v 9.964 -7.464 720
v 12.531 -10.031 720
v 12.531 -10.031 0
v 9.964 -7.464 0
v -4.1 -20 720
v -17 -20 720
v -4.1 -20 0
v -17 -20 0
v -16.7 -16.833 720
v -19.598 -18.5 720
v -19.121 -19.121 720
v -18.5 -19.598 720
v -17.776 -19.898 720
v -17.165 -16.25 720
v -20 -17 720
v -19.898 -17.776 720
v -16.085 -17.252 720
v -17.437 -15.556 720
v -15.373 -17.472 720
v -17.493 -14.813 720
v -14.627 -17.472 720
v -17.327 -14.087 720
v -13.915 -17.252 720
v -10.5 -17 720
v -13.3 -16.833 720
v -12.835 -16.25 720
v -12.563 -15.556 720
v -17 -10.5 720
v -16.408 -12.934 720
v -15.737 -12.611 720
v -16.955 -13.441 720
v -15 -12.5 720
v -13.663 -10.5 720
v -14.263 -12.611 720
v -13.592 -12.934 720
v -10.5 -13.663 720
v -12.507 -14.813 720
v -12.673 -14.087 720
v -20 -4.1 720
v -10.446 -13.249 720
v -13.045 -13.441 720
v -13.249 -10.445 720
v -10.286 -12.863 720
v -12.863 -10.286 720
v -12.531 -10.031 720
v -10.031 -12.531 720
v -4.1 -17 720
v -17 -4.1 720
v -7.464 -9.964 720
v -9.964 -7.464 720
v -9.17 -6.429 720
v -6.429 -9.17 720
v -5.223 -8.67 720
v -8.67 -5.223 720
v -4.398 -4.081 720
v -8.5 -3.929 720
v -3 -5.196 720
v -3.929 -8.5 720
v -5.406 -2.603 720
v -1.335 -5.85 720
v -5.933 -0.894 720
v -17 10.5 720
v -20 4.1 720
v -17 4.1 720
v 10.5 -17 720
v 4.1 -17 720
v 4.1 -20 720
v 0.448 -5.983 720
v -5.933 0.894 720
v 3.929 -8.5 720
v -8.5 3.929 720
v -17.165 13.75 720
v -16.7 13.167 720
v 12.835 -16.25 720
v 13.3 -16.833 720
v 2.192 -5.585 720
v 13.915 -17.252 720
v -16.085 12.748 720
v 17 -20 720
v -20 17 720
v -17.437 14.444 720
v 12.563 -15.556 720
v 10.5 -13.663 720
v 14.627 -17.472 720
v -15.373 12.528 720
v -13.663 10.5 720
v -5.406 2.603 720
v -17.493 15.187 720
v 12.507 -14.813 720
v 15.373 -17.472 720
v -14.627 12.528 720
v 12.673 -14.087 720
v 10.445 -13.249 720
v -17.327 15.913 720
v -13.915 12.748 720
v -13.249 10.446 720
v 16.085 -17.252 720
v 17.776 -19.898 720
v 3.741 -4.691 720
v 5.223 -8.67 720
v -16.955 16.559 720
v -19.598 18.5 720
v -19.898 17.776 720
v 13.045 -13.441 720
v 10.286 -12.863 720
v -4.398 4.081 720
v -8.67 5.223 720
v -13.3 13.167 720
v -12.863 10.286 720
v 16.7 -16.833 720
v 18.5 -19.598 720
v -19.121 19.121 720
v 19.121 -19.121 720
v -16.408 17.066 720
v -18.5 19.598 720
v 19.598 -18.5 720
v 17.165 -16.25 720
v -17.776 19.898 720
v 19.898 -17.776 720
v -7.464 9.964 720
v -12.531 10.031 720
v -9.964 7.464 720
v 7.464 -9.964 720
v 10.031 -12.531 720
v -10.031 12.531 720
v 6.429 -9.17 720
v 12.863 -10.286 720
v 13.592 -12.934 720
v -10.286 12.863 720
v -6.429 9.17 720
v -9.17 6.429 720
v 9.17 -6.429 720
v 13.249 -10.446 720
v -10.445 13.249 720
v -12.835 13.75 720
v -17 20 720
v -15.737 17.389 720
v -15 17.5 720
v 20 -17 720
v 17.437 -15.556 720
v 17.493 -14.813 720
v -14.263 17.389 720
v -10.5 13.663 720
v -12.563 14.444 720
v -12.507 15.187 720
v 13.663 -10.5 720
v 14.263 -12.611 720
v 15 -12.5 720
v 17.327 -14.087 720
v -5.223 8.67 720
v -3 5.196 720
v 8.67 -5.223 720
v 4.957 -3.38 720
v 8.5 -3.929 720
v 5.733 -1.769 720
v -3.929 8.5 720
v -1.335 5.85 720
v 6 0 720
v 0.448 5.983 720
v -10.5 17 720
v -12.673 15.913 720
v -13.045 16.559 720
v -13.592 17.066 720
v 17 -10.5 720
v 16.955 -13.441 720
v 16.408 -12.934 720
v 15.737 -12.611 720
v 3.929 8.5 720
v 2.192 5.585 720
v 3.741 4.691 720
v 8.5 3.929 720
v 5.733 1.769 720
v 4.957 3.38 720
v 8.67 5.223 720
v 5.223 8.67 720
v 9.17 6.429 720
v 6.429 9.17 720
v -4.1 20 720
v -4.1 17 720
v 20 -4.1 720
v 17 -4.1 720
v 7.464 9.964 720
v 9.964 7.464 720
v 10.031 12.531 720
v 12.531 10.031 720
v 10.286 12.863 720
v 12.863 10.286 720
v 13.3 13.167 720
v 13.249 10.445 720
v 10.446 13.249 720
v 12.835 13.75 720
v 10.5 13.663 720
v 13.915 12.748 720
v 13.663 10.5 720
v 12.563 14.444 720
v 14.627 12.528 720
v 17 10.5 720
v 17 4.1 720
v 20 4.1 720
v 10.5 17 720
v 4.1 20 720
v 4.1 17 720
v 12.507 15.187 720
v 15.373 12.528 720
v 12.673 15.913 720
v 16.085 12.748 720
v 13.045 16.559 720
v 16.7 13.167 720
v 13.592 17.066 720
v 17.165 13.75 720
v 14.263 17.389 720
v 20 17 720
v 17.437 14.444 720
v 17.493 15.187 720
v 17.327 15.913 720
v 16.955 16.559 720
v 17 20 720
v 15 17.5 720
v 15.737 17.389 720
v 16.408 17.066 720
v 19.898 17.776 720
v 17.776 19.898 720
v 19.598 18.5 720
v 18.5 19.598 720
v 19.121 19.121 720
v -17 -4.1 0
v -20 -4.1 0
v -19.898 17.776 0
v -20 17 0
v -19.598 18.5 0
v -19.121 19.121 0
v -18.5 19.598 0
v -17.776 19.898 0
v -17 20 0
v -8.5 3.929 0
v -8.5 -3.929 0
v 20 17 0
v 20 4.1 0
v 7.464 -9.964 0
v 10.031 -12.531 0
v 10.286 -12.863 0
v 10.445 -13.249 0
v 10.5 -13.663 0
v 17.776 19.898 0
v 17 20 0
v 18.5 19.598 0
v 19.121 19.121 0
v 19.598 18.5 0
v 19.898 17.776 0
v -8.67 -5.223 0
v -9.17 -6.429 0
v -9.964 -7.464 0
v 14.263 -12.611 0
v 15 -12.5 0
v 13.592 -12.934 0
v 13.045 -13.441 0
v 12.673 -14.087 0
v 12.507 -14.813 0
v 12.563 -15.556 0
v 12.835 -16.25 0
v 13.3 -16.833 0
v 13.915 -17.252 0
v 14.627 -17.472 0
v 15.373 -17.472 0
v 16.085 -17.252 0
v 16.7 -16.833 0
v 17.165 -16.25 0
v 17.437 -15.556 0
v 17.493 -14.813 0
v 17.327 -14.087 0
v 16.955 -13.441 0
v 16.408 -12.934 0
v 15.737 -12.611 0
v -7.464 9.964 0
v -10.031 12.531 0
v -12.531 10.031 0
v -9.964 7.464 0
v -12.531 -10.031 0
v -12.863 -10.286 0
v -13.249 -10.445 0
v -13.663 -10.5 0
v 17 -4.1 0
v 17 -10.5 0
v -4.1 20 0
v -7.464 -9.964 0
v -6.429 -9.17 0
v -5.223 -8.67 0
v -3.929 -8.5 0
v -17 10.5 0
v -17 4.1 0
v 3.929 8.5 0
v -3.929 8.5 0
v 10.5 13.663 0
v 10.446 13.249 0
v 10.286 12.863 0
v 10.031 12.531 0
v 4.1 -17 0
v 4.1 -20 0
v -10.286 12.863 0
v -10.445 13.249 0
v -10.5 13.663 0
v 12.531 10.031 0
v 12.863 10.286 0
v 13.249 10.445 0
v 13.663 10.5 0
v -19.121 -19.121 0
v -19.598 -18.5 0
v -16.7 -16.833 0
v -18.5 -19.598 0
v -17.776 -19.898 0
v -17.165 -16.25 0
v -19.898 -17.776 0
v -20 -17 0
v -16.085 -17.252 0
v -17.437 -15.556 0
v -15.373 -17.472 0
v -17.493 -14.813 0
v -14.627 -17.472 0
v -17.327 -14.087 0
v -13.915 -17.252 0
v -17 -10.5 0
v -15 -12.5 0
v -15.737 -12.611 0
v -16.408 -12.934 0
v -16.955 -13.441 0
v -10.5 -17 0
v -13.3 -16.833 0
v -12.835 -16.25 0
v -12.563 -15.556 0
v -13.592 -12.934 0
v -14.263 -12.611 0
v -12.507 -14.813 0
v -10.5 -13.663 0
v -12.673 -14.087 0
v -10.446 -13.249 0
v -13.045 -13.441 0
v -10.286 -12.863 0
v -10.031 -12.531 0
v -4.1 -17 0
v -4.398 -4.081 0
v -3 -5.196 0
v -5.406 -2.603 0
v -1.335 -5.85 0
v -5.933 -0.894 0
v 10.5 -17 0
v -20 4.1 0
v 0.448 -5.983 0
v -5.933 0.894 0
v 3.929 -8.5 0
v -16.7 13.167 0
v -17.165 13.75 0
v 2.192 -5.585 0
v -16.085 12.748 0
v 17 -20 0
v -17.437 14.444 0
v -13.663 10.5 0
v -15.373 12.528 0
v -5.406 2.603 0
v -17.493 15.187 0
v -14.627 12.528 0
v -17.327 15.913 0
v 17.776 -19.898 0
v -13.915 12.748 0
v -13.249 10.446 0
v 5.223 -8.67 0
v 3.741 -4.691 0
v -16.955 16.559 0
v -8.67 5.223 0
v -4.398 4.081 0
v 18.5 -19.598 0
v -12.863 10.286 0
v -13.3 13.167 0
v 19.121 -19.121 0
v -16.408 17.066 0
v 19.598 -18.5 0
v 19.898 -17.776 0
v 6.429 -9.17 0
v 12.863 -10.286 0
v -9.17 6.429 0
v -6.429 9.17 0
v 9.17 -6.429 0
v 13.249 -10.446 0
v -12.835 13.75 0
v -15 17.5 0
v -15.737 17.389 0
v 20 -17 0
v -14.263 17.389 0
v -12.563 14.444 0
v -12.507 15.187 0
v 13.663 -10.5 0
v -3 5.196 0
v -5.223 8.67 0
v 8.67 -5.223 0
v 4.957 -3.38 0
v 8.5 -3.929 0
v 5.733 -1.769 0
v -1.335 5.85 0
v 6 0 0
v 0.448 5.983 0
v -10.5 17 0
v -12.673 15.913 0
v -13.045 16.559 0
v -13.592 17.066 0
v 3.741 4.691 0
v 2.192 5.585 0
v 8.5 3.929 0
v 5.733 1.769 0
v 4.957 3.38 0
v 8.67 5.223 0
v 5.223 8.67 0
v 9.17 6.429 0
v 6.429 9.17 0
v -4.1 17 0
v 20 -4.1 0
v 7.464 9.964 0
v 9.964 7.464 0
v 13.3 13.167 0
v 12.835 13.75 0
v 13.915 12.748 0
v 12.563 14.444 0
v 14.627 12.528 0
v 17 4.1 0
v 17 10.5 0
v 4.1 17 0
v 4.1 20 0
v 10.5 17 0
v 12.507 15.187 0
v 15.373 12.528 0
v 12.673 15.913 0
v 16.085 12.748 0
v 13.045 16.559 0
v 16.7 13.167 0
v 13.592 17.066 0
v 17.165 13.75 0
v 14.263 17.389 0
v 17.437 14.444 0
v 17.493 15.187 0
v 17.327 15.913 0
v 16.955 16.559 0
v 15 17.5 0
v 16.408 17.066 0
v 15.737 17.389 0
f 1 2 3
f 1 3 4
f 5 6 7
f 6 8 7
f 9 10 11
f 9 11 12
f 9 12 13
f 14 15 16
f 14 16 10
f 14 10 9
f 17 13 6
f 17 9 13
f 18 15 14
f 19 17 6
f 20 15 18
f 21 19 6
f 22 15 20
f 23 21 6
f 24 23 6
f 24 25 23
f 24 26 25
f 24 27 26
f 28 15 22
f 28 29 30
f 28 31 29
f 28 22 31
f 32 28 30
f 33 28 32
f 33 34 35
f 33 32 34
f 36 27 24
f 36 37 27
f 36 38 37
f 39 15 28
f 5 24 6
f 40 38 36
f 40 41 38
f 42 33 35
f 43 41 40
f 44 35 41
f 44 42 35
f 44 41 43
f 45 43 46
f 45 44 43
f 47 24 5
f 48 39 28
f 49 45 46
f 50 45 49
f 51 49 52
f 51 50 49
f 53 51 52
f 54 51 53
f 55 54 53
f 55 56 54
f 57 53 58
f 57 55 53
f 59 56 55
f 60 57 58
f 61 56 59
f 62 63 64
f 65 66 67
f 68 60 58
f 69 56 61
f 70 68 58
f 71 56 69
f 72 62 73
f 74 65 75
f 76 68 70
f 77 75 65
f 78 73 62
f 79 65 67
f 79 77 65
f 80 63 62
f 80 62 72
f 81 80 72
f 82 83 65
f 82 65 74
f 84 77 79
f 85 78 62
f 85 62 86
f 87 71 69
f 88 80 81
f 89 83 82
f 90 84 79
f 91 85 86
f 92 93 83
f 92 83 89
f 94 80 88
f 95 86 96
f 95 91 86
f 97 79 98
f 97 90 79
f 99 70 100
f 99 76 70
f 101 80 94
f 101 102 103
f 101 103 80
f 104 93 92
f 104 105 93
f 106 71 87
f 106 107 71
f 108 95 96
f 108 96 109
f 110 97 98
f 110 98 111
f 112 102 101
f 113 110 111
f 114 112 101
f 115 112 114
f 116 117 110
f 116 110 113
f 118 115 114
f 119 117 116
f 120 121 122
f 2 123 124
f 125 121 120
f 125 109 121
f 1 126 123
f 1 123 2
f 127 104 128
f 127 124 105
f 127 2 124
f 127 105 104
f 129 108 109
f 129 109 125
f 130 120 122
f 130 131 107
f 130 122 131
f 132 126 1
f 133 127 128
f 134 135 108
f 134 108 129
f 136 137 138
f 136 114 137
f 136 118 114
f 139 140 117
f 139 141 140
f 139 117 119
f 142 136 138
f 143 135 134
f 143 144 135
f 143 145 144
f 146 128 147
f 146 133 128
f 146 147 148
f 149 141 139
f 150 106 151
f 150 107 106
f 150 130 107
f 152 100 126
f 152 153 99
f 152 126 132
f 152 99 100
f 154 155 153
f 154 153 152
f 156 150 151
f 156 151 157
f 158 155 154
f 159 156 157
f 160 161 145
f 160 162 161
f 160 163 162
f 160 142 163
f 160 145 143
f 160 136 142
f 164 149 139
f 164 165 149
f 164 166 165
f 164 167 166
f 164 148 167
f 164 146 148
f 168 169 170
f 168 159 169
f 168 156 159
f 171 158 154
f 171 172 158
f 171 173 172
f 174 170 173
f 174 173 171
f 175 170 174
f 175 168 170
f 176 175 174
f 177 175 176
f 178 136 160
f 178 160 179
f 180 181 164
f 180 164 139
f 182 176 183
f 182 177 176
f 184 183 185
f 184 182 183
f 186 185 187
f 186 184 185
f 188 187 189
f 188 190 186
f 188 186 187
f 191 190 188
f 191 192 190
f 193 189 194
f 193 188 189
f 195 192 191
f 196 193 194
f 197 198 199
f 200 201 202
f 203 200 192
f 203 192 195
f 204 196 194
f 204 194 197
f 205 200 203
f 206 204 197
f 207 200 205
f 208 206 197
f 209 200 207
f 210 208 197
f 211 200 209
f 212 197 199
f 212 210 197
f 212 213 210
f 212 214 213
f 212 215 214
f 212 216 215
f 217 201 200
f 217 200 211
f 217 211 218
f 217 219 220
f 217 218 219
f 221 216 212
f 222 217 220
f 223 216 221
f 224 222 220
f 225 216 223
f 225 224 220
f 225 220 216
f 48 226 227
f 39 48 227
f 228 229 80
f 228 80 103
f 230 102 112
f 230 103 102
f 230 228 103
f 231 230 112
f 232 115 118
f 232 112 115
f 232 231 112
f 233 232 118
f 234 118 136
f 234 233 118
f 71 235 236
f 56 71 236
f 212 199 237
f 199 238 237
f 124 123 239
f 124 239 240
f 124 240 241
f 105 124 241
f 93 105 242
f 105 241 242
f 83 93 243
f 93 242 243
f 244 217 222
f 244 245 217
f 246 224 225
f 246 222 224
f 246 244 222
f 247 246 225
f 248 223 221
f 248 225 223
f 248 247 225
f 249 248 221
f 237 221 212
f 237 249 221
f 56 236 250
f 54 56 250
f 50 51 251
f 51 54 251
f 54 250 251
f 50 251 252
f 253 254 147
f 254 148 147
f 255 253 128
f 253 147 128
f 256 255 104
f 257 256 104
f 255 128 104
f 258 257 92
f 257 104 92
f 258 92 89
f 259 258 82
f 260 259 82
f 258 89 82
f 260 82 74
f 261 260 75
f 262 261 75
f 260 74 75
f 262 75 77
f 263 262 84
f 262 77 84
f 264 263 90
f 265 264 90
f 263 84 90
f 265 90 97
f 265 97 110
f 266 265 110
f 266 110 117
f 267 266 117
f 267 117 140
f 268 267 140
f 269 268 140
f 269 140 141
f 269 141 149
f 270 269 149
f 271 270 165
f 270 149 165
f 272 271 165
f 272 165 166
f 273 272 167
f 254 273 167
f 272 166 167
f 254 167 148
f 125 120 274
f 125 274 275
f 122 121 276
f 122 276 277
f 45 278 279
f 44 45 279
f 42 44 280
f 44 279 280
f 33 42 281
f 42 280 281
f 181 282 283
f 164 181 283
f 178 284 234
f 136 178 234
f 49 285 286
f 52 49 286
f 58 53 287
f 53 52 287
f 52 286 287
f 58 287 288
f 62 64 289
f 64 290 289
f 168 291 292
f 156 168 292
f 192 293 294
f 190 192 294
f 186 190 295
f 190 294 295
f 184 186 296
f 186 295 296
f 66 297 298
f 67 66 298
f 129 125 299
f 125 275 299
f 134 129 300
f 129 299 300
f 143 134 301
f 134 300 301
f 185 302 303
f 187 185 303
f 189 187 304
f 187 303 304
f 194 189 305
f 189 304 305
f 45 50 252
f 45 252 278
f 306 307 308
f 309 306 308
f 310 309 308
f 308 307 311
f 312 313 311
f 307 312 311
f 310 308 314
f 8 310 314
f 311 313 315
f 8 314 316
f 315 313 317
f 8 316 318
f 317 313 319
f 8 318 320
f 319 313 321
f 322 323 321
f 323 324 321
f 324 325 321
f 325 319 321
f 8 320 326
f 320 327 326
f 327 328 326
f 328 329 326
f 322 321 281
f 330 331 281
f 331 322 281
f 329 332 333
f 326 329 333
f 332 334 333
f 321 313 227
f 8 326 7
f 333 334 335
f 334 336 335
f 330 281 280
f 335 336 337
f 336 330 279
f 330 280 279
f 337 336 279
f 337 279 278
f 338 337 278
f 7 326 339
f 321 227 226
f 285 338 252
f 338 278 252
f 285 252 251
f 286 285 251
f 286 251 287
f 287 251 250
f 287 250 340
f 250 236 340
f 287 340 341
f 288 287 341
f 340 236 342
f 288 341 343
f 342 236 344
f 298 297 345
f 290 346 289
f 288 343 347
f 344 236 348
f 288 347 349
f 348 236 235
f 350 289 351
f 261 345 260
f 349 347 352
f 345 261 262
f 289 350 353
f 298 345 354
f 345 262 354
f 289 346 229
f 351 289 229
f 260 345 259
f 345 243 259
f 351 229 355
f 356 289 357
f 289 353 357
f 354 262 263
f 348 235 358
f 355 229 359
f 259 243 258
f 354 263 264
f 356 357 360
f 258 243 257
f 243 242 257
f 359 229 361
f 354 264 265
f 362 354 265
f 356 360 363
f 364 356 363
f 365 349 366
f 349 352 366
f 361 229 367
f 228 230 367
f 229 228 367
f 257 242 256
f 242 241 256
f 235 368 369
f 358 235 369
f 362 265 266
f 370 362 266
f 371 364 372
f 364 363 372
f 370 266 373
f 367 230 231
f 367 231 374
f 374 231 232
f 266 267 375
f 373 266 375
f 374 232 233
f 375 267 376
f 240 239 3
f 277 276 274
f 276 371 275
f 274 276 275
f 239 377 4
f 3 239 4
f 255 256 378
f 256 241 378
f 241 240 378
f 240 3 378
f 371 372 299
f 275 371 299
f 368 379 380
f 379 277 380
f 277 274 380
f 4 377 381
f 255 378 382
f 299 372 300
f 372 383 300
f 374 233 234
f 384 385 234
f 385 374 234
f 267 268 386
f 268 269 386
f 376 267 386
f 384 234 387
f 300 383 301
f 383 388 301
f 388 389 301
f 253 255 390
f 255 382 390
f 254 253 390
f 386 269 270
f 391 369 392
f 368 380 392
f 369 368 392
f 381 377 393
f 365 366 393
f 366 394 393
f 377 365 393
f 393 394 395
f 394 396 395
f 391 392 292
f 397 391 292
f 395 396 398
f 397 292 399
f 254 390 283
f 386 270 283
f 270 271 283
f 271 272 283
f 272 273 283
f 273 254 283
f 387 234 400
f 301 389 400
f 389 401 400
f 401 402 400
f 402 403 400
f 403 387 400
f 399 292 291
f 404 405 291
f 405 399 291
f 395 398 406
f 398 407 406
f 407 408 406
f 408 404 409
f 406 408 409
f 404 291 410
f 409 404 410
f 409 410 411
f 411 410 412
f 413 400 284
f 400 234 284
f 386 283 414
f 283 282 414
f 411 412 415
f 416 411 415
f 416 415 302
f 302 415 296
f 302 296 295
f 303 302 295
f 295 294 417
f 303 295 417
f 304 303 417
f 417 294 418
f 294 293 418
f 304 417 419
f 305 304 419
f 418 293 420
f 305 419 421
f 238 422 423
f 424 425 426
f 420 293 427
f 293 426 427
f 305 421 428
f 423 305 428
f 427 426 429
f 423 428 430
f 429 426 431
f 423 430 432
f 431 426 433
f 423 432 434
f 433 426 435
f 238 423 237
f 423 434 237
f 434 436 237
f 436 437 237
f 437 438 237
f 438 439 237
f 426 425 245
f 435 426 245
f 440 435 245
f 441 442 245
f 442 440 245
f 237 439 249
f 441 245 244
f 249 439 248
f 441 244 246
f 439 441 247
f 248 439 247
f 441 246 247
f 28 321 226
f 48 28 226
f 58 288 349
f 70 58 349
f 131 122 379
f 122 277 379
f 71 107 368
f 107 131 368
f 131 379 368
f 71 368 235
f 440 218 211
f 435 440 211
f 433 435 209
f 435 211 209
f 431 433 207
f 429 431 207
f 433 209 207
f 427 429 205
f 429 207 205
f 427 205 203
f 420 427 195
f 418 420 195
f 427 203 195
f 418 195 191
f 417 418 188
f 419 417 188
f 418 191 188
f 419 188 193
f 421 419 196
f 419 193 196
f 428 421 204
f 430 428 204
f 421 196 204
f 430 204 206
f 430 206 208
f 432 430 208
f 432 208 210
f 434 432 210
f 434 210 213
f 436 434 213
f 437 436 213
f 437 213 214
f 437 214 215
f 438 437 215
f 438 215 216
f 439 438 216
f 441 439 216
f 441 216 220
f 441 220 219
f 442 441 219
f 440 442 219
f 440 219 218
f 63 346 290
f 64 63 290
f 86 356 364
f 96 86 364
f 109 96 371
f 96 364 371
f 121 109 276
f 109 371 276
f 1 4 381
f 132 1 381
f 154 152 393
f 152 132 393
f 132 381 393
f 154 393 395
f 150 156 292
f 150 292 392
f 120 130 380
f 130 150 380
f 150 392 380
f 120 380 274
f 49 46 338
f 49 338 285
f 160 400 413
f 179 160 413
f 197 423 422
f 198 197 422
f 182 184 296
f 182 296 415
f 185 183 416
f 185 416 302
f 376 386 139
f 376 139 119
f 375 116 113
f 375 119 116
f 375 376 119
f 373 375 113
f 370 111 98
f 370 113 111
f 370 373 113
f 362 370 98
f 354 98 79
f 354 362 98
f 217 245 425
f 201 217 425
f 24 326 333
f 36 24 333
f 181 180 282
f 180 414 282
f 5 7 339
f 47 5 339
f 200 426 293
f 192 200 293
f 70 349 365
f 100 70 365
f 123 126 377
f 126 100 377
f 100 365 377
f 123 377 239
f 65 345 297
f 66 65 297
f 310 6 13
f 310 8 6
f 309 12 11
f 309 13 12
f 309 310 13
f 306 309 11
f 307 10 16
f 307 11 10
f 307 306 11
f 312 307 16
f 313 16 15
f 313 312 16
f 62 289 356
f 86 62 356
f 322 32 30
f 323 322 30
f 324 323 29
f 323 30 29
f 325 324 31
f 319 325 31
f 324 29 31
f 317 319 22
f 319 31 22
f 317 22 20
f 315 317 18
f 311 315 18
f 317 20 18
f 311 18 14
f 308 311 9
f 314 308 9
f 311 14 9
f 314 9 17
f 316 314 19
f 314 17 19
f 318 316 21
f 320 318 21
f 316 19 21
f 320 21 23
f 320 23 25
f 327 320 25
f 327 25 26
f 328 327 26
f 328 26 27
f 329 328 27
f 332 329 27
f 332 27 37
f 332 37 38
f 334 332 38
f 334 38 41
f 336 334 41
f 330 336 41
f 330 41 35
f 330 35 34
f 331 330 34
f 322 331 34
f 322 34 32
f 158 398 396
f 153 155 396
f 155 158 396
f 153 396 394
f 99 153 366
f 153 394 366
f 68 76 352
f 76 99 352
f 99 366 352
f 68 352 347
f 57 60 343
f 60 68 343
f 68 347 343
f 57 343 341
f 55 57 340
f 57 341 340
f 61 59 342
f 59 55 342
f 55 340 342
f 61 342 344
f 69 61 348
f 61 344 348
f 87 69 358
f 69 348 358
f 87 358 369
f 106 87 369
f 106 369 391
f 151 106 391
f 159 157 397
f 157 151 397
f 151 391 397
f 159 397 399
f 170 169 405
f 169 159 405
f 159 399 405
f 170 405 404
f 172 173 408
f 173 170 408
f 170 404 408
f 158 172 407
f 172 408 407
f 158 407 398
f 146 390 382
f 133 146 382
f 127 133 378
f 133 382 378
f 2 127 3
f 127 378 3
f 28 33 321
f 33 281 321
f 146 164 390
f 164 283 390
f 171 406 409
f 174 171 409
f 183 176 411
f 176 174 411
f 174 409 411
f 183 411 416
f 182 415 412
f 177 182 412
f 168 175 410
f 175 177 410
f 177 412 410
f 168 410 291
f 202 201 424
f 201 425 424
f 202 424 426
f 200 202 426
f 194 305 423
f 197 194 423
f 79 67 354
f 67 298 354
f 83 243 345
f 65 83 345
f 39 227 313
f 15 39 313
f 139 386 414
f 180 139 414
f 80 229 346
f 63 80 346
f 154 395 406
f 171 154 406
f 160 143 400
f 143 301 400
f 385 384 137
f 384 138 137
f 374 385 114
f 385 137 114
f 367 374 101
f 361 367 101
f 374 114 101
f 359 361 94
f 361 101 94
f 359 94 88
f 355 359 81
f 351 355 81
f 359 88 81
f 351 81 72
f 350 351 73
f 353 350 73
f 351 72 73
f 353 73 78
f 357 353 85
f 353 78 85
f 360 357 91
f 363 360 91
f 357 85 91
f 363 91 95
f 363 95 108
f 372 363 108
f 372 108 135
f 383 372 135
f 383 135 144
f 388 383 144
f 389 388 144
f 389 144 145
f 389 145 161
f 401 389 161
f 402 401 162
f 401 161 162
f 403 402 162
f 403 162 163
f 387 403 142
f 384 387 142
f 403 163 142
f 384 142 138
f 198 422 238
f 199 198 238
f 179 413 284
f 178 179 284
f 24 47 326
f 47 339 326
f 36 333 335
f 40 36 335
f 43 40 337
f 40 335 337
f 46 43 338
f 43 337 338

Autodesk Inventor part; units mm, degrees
sketch "Skizze_1" plane through (0, 0, 0) normal (0, 0, 1) x (1, 0, 0)
  arc A0 (-20, -17) -> (-17, -20) centre (-17, -17) ccw
  line L0 (-17, -20) -> (-4.1, -20)
  line L1 (-4.1, -20) -> (-4.1, -17)
  line L2 (-4.1, -17) -> (-10.5, -17)
  line L3 (-10.5, -17) -> (-10.5, -13.6627)
  arc A1 (-10.0314, -12.5314) -> (-10.5, -13.6627) centre (-8.9002, -13.6627) ccw
  line L4 (-10.0314, -12.5314) -> (-7.4645, -9.9645)
  arc A2 (-3.9289, -8.5) -> (-7.4645, -9.9645) centre (-3.9289, -13.5) ccw
  line L5 (-3.9289, -8.5) -> (3.9289, -8.5)
  arc A3 (7.4645, -9.9645) -> (3.9289, -8.5) centre (3.9289, -13.5) ccw
  line L6 (7.4645, -9.9645) -> (10.0314, -12.5314)
  arc A4 (10.5, -13.6627) -> (10.0314, -12.5314) centre (8.9002, -13.6627) ccw
  line L7 (10.5, -13.6627) -> (10.5, -17)
  line L8 (10.5, -17) -> (4.1, -17)
  line L9 (4.1, -17) -> (4.1, -20)
  line L10 (4.1, -20) -> (17, -20)
  arc A5 (17, -20) -> (20, -17) centre (17, -17) ccw
  line L11 (20, -17) -> (20, -4.1)
  line L12 (20, -4.1) -> (17, -4.1)
  line L13 (17, -4.1) -> (17, -10.5)
  line L14 (17, -10.5) -> (13.6627, -10.5)
  arc A6 (12.5314, -10.0314) -> (13.6627, -10.5) centre (13.6627, -8.9002) ccw
  line L15 (12.5314, -10.0314) -> (9.9645, -7.4645)
  arc A7 (8.5, -3.9289) -> (9.9645, -7.4645) centre (13.5, -3.9289) ccw
  line L16 (8.5, -3.9289) -> (8.5, 3.9289)
  arc A8 (9.9645, 7.4645) -> (8.5, 3.9289) centre (13.5, 3.9289) ccw
  line L17 (9.9645, 7.4645) -> (12.5314, 10.0314)
  arc A9 (13.6627, 10.5) -> (12.5314, 10.0314) centre (13.6627, 8.9002) ccw
  line L18 (13.6627, 10.5) -> (17, 10.5)
  line L19 (17, 10.5) -> (17, 4.1)
  line L20 (17, 4.1) -> (20, 4.1)
  line L21 (20, 4.1) -> (20, 17)
  arc A10 (20, 17) -> (17, 20) centre (17, 17) ccw
  line L22 (17, 20) -> (4.1, 20)
  line L23 (4.1, 20) -> (4.1, 17)
  line L24 (4.1, 17) -> (10.5, 17)
  line L25 (10.5, 17) -> (10.5, 13.6627)
  arc A11 (10.0314, 12.5314) -> (10.5, 13.6627) centre (8.9002, 13.6627) ccw
  line L26 (10.0314, 12.5314) -> (7.4645, 9.9645)
  arc A12 (3.9289, 8.5) -> (7.4645, 9.9645) centre (3.9289, 13.5) ccw
  line L27 (3.9289, 8.5) -> (-3.9289, 8.5)
  arc A13 (-7.4645, 9.9645) -> (-3.9289, 8.5) centre (-3.9289, 13.5) ccw
  line L28 (-7.4645, 9.9645) -> (-10.0314, 12.5314)
  arc A14 (-10.5, 13.6627) -> (-10.0314, 12.5314) centre (-8.9002, 13.6627) ccw
  line L29 (-10.5, 13.6627) -> (-10.5, 17)
  line L30 (-10.5, 17) -> (-4.1, 17)
  line L31 (-4.1, 17) -> (-4.1, 20)
  line L32 (-4.1, 20) -> (-17, 20)
  arc A15 (-17, 20) -> (-20, 17) centre (-17, 17) ccw
  line L33 (-20, 17) -> (-20, 4.1)
  line L34 (-20, 4.1) -> (-17, 4.1)
  line L35 (-17, 4.1) -> (-17, 10.5)
  line L36 (-17, 10.5) -> (-13.6627, 10.5)
  arc A16 (-12.5314, 10.0314) -> (-13.6627, 10.5) centre (-13.6627, 8.9002) ccw
  line L37 (-12.5314, 10.0314) -> (-9.9645, 7.4645)
  arc A17 (-8.5, 3.9289) -> (-9.9645, 7.4645) centre (-13.5, 3.9289) ccw
  line L38 (-8.5, 3.9289) -> (-8.5, -3.9289)
  arc A18 (-9.9645, -7.4645) -> (-8.5, -3.9289) centre (-13.5, -3.9289) ccw
  line L39 (-9.9645, -7.4645) -> (-12.5314, -10.0314)
  arc A19 (-13.6627, -10.5) -> (-12.5314, -10.0314) centre (-13.6627, -8.9002) ccw
  line L40 (-13.6627, -10.5) -> (-17, -10.5)
  line L41 (-17, -10.5) -> (-17, -4.1)
  line L42 (-17, -4.1) -> (-20, -4.1)
  line L43 (-20, -4.1) -> (-20, -17)
  circle A20 centre (0, 0) radius 6
extrude "Extrusion1" add sketch "Skizze_1" along normal blind 720
sketch "Sketch2" plane through (0, 0, 0) normal (0, 0, -1) x (1, 0, 0)
  point P0 (-15, -15)
hole "Drilling 1" at (-15, 15, 0) direction (0, 0, 1) diameter 5 depth 6000
sketch "Sketch3" plane through (0, 0, 0) normal (0, 0, -1) x (1, 0, 0)
  point P0 (15, -15)
hole "Drilling 2" at (15, 15, 0) direction (0, 0, 1) diameter 5 depth 6000
sketch "Sketch4" plane through (0, 0, 0) normal (0, 0, -1) x (1, 0, 0)
  point P0 (15, 15)
hole "Drilling 3" at (15, -15, 0) direction (0, 0, 1) diameter 5 depth 6000
sketch "Sketch5" plane through (0, 0, 0) normal (0, 0, -1) x (1, 0, 0)
  point P0 (-15, 15)
hole "Drilling 4" at (-15, -15, 0) direction (0, 0, 1) diameter 5 depth 6000
ref_plane "side_4d_XY" through (-20, 0, -330) normal (-1, 0, 0) x (0, 1, 0)
ref_plane "side_4d_YZ" through (-20, 0, -330) normal (0, 1, 0) x (0, 0, -1)
ref_plane "side_4d_ZX" through (-20, 0, -330) normal (0, 0, -1) x (-1, 0, 0)
ref_plane "side_1a_XY" through (0, 20, -330) normal (0, 1, 0) x (1, 0, 0)
ref_plane "side_1a_YZ" through (0, 20, -330) normal (1, 0, 0) x (0, 0, -1)
ref_plane "side_1a_ZX" through (0, 20, -330) normal (0, 0, -1) x (0, 1, 0)
ref_plane "side_2b_XY" through (20, 0, -330) normal (1, 0, 0) x (0, -1, 0)
ref_plane "side_2b_YZ" through (20, 0, -330) normal (0, -1, 0) x (0, 0, -1)
ref_plane "side_2b_ZX" through (20, 0, -330) normal (0, 0, -1) x (1, 0, 0)
ref_plane "side_3c_XY" through (0, -20, -330) normal (0, -1, 0) x (-1, 0, 0)
ref_plane "side_3c_YZ" through (0, -20, -330) normal (-1, 0, 0) x (0, 0, -1)
ref_plane "side_3c_ZX" through (0, -20, -330) normal (0, 0, -1) x (0, -1, 0)
ref_plane "end_XY" through (0, 0, -660) normal (0, 0, -1) x (1, 0, 0)
ref_plane "end_YZ" through (0, 0, -660) normal (1, 0, 0) x (0, -1, 0)
ref_plane "end_ZX" through (0, 0, -660) normal (0, -1, 0) x (0, 0, -1)
ref_plane "start_XY" through (0, 0, 0) normal (0, 0, 1) x (1, 0, 0)
ref_plane "start_YZ" through (0, 0, 0) normal (1, 0, 0) x (0, 1, 0)
ref_plane "start_ZX" through (0, 0, 0) normal (0, 1, 0) x (0, 0, 1)
properties part number "MayTec 1.11.040040.43S_Profile 40x40, 4E, S_660_Detail_(0;0,0,0)"
